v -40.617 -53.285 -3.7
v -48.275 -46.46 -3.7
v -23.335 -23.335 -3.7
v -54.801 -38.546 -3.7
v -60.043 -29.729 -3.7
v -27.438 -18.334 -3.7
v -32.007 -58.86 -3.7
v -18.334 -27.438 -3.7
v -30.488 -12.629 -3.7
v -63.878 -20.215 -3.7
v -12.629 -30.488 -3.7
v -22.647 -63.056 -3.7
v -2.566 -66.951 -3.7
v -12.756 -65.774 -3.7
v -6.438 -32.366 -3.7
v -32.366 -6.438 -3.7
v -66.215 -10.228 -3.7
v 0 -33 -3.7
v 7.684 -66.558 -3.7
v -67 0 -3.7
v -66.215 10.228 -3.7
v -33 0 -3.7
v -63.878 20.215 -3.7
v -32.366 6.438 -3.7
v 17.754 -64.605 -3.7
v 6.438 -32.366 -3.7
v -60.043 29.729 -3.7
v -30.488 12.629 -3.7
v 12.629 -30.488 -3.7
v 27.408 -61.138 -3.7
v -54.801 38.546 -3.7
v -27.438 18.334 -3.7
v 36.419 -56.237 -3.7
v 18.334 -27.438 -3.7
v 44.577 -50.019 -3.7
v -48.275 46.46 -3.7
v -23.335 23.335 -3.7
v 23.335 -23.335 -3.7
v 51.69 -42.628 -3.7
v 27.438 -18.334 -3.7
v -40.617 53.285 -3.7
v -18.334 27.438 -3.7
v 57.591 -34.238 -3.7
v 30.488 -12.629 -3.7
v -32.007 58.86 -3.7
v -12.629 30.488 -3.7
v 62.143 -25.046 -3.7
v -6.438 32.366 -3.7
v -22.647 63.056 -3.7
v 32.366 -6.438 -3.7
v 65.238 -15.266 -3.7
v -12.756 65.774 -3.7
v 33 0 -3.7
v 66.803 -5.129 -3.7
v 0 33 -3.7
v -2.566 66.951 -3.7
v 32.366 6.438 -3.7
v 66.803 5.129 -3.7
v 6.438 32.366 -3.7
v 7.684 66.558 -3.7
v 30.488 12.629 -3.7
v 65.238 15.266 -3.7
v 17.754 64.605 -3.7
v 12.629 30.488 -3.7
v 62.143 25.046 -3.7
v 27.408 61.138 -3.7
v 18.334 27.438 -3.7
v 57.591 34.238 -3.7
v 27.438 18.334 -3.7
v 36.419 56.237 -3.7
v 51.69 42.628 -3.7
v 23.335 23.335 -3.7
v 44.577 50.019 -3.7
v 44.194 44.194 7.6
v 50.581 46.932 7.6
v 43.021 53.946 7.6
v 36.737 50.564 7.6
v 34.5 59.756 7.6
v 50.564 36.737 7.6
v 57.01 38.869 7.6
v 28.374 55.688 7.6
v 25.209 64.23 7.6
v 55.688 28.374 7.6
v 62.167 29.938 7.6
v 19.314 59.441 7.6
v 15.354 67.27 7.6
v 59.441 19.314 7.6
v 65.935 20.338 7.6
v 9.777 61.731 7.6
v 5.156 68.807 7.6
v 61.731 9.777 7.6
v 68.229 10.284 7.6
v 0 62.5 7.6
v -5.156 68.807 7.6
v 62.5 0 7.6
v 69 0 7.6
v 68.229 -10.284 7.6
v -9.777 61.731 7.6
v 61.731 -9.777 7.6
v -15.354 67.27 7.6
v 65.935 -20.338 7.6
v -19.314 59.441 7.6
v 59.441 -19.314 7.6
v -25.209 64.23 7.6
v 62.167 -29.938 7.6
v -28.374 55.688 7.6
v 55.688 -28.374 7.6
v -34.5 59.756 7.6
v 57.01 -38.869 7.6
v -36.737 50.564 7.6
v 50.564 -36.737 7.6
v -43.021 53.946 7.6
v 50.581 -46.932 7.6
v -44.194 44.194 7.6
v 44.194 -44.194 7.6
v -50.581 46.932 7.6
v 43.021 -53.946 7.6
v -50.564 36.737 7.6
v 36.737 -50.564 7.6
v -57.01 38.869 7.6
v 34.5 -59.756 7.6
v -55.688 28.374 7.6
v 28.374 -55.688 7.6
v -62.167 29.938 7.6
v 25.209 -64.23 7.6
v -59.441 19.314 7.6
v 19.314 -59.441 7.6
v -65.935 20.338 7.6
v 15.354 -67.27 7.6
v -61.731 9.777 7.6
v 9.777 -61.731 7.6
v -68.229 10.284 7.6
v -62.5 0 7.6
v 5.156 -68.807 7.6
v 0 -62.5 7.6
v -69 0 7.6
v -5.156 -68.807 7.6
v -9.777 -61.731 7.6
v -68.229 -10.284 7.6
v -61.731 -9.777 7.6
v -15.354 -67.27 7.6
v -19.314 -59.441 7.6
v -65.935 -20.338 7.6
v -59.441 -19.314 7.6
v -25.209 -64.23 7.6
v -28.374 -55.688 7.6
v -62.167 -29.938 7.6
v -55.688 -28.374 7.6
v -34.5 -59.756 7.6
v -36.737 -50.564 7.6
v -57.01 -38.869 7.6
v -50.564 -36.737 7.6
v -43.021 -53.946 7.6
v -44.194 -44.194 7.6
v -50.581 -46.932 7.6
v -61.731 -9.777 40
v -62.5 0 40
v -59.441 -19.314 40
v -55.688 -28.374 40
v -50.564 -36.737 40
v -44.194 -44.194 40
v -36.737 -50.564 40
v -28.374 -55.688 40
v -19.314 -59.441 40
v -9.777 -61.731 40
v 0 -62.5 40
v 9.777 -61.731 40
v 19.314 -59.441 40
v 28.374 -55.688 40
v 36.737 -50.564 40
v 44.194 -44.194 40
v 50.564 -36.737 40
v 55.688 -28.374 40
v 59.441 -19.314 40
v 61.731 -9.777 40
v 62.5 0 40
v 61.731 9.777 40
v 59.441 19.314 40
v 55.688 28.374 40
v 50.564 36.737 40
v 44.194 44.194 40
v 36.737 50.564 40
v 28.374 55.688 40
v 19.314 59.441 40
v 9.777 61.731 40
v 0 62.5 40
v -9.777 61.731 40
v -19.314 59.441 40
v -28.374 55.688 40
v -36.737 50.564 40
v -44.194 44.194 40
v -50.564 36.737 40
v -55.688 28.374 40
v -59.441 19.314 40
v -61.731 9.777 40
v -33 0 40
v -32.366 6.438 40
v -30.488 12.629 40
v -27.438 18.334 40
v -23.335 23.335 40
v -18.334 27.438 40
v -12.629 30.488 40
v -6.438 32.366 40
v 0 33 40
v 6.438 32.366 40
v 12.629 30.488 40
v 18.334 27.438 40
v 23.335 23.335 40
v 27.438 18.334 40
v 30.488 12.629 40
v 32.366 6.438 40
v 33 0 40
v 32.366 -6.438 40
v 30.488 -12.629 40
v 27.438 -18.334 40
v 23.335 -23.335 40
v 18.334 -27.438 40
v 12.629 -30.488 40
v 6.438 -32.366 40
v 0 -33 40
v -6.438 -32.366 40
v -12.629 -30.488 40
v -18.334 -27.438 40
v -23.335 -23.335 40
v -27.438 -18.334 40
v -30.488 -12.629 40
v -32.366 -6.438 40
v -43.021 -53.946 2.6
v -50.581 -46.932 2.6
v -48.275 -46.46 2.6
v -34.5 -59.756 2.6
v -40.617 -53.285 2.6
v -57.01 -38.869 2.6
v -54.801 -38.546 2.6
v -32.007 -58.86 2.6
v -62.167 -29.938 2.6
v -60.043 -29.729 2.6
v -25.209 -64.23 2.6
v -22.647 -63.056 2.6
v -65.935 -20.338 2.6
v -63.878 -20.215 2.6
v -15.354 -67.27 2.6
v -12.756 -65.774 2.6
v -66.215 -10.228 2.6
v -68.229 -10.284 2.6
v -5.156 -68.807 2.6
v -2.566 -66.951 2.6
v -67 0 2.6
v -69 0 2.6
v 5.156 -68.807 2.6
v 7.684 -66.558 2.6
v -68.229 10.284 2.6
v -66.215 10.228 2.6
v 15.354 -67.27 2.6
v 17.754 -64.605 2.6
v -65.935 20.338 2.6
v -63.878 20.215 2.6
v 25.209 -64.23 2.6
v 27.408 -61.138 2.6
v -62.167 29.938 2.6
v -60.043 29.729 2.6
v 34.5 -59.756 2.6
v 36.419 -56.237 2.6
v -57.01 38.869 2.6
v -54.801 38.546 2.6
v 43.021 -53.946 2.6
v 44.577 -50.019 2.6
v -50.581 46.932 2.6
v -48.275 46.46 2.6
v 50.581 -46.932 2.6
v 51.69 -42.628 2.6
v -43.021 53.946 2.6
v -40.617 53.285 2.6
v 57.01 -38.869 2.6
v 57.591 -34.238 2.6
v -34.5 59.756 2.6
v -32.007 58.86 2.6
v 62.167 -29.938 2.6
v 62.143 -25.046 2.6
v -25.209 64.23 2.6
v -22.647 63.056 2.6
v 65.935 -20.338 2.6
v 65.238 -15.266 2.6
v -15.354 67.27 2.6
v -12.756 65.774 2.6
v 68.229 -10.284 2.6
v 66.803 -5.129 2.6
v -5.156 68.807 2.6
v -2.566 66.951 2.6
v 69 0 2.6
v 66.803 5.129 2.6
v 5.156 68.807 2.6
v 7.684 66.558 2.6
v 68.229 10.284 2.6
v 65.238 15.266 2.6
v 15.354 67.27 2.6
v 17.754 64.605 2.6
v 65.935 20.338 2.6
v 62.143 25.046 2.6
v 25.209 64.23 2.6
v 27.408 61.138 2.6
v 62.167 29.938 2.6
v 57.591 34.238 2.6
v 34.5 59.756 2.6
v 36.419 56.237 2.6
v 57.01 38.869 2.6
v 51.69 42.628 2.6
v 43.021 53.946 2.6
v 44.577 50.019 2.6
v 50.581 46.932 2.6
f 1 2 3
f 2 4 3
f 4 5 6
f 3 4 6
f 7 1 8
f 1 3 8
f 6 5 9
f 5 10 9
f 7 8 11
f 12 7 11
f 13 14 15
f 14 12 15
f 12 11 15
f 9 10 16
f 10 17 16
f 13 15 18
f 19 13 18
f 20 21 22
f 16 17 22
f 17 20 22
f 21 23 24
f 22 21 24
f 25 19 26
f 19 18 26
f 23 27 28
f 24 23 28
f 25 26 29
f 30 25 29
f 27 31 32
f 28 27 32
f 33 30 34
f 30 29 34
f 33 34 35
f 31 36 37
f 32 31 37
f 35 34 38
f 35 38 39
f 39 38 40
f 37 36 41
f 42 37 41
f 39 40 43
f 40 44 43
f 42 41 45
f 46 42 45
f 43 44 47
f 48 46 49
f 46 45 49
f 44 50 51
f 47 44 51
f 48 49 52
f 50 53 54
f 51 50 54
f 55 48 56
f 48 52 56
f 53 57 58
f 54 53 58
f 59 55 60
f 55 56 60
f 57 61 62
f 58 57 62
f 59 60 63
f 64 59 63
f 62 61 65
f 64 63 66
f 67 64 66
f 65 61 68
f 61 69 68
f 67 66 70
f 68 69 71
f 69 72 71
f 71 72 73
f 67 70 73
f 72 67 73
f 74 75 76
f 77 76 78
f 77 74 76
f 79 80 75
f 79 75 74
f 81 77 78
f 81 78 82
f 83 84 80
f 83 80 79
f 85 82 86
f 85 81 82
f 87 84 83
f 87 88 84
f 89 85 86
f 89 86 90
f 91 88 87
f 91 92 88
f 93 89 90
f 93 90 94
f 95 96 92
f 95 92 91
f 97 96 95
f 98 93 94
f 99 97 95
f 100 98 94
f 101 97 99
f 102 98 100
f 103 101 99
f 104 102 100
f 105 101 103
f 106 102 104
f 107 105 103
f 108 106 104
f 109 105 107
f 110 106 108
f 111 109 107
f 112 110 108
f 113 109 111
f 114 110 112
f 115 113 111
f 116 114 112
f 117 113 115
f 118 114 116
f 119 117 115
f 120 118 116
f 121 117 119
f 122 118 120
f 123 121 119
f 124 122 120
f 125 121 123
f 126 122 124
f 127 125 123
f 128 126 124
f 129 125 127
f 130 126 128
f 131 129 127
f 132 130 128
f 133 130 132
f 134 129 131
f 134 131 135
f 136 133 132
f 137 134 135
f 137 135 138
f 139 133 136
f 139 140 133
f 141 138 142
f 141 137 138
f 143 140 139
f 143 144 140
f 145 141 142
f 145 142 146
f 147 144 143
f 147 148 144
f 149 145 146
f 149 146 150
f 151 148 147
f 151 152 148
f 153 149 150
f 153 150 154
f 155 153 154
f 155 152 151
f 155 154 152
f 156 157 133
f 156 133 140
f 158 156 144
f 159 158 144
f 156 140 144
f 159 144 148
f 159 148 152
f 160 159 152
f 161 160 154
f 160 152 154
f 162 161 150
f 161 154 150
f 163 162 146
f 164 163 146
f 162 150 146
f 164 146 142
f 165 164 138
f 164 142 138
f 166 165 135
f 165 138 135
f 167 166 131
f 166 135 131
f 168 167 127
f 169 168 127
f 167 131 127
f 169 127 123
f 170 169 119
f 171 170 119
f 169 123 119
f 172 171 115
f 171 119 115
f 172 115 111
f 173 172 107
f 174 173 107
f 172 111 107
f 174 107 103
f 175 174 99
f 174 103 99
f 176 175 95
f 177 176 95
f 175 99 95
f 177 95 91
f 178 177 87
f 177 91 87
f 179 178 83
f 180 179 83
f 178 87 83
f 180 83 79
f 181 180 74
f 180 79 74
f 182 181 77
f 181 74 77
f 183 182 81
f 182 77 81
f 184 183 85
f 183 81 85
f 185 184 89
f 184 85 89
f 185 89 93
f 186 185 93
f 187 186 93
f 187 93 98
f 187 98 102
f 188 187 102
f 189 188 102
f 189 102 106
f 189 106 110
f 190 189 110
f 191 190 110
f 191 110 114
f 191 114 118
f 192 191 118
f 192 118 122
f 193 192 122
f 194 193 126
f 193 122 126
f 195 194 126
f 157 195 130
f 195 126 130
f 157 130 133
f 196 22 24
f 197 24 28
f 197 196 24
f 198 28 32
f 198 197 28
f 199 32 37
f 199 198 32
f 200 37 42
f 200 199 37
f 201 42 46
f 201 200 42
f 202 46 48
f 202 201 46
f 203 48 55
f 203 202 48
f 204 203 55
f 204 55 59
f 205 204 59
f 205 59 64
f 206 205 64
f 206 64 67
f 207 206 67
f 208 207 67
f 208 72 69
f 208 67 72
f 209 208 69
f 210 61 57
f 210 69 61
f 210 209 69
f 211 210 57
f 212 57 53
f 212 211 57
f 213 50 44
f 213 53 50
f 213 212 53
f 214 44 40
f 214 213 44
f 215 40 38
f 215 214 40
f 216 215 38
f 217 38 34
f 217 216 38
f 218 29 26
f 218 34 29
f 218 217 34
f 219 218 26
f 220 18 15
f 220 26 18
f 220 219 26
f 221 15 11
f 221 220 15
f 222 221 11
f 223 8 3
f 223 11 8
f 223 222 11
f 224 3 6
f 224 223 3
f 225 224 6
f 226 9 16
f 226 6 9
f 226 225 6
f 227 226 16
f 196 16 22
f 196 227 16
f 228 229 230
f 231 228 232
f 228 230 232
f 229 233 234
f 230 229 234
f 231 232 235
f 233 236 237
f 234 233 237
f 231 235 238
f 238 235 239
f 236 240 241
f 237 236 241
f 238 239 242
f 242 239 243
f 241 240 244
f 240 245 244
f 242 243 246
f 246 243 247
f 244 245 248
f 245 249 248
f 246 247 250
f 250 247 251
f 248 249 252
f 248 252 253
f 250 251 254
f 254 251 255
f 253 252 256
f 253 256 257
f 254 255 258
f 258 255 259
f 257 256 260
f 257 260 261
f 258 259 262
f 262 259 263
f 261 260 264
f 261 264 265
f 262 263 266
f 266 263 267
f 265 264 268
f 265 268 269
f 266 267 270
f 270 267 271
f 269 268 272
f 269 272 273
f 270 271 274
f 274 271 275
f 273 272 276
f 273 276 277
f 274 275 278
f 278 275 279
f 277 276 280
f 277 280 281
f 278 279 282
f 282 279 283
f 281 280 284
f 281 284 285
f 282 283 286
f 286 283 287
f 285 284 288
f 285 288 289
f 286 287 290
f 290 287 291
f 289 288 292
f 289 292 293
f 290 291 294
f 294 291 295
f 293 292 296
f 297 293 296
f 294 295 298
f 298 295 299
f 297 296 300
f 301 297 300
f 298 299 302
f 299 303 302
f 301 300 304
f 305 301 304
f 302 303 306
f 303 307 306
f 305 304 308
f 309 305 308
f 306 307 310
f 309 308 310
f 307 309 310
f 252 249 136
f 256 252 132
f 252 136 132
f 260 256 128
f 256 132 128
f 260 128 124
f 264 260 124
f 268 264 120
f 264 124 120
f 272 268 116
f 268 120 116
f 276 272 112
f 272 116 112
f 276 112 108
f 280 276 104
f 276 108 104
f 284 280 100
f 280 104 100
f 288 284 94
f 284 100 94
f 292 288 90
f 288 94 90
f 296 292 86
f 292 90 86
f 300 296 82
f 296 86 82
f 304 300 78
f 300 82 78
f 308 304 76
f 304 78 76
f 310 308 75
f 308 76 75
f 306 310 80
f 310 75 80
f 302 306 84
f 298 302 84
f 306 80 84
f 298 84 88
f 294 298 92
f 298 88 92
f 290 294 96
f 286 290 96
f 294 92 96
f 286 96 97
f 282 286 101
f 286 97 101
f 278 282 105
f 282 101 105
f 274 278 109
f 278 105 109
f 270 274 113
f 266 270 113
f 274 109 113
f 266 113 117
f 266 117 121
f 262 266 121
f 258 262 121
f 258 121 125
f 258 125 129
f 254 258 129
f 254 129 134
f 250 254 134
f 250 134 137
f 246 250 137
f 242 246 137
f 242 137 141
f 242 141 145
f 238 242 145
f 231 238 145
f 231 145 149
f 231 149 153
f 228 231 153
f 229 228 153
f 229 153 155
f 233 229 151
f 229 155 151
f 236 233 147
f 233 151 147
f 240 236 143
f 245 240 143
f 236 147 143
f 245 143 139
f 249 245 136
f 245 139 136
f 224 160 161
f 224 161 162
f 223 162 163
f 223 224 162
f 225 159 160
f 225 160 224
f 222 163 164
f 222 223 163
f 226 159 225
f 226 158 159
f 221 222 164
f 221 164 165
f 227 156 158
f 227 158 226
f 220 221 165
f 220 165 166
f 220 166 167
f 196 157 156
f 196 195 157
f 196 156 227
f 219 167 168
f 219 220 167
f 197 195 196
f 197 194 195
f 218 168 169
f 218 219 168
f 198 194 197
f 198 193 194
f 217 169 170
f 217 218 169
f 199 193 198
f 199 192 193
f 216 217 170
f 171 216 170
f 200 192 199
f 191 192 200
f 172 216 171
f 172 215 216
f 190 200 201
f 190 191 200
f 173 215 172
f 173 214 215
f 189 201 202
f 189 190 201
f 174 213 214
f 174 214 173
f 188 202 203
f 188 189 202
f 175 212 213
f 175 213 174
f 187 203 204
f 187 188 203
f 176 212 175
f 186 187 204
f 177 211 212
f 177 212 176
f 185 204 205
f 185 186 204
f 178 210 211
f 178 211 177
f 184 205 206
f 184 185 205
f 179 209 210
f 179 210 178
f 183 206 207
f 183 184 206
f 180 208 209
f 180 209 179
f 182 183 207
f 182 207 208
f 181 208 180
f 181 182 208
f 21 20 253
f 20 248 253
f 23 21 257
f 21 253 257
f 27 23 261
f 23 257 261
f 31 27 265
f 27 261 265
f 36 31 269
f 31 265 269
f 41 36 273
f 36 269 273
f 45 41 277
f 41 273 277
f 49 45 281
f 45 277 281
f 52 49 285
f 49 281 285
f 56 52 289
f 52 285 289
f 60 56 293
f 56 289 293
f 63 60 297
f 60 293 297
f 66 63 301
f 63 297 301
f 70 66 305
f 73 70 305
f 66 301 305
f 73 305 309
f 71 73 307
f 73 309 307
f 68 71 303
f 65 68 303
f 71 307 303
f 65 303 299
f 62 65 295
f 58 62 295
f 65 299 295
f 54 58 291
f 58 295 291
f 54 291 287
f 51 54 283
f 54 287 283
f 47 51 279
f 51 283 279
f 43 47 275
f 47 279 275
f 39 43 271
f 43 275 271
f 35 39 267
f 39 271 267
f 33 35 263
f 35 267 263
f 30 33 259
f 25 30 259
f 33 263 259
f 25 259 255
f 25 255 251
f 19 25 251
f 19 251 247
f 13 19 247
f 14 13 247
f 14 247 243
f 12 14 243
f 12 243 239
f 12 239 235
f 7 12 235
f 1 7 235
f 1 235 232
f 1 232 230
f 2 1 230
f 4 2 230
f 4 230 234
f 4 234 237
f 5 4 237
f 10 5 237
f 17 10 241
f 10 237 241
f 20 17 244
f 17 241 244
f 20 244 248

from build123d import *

# Parameters (mm, degrees)
SKETCH1_R           = 70
BOSS_EXTRUDE1_DEPTH = 40
SKETCH3_W           = 6.5
SKETCH3_H           = 32.4
SKETCH5_W           = 9.259396931
SKETCH5_H           = 5.5
SKETCH6_W           = 156.018137672
SKETCH6_H           = 46.428345924
CUT_EXTRUDE1_DEPTH  = 81


with BuildPart() as part:
    # Sketch1 → Boss-Extrude1 (new body, symmetric)
    with BuildSketch(Plane.XY):
        Circle(SKETCH1_R)
    extrude(amount=BOSS_EXTRUDE1_DEPTH, both=True)

    # Sketch2 → Cut-Revolve1 (revolve, cut)
    with BuildSketch(Plane(origin=(0, 0, 0), x_dir=(1, 0, 0), z_dir=(0, 1, 0))):
        Polygon((-69, 40), (-69, 35), (-67, 35), (-67, 28.7), (-60, 28.7), (-60, 3.7), (-67, 3.7), (-67, -2.6), (-69, -2.6), (-69, -44.705491592), (-73.643536697, -44.705491592), (-73.643536697, 40), align=None)
    revolve(axis=Axis((0, 0, 0), (0, 0, -1)), mode=Mode.SUBTRACT)

    # Sketch3 → Cut-Revolve2 (revolve, cut)
    with BuildSketch(Plane(origin=(0, 0, 0), x_dir=(1, 0, 0), z_dir=(0, 1, 0))):
        with Locations((-65.75, -23.8)):
            Rectangle(SKETCH3_W, SKETCH3_H)
    revolve(axis=Axis((0, 0, 0), (0, 0, 1)), mode=Mode.SUBTRACT)

    # Sketch4 → Cut-Revolve3 (revolve, cut)
    with BuildSketch(Plane(origin=(0, 0, 0), x_dir=(1, 0, 0), z_dir=(0, 1, 0))):
        Polygon((0, 42.623044552), (-37.5, 42.623044552), (-37.5, 20), (-33, 20), (-33, -40), (0, -40), align=None)
    revolve(axis=Axis((0, 0, 0), (0, 0, -1)), mode=Mode.SUBTRACT)

    # Sketch5 → Cut-Revolve4 (revolve, cut)
    with BuildSketch(Plane(origin=(0, 0, 0), x_dir=(1, 0, 0), z_dir=(0, 1, 0))):
        with Locations((-37.620301535, 32.25)):
            Rectangle(SKETCH5_W, SKETCH5_H)
    revolve(axis=Axis((0, 0, 0), (0, 0, -1)), mode=Mode.SUBTRACT)

    # Sketch6 → Cut-Extrude1 (cut, symmetric)
    with BuildSketch(Plane(origin=(0, 0, 0), x_dir=(1, 0, 0), z_dir=(0, 1, 0))):
        with Locations((-2.837222121, 26.914172962)):
            Rectangle(SKETCH6_W, SKETCH6_H)
    extrude(amount=CUT_EXTRUDE1_DEPTH, both=True, mode=Mode.SUBTRACT)


solid = part.part
